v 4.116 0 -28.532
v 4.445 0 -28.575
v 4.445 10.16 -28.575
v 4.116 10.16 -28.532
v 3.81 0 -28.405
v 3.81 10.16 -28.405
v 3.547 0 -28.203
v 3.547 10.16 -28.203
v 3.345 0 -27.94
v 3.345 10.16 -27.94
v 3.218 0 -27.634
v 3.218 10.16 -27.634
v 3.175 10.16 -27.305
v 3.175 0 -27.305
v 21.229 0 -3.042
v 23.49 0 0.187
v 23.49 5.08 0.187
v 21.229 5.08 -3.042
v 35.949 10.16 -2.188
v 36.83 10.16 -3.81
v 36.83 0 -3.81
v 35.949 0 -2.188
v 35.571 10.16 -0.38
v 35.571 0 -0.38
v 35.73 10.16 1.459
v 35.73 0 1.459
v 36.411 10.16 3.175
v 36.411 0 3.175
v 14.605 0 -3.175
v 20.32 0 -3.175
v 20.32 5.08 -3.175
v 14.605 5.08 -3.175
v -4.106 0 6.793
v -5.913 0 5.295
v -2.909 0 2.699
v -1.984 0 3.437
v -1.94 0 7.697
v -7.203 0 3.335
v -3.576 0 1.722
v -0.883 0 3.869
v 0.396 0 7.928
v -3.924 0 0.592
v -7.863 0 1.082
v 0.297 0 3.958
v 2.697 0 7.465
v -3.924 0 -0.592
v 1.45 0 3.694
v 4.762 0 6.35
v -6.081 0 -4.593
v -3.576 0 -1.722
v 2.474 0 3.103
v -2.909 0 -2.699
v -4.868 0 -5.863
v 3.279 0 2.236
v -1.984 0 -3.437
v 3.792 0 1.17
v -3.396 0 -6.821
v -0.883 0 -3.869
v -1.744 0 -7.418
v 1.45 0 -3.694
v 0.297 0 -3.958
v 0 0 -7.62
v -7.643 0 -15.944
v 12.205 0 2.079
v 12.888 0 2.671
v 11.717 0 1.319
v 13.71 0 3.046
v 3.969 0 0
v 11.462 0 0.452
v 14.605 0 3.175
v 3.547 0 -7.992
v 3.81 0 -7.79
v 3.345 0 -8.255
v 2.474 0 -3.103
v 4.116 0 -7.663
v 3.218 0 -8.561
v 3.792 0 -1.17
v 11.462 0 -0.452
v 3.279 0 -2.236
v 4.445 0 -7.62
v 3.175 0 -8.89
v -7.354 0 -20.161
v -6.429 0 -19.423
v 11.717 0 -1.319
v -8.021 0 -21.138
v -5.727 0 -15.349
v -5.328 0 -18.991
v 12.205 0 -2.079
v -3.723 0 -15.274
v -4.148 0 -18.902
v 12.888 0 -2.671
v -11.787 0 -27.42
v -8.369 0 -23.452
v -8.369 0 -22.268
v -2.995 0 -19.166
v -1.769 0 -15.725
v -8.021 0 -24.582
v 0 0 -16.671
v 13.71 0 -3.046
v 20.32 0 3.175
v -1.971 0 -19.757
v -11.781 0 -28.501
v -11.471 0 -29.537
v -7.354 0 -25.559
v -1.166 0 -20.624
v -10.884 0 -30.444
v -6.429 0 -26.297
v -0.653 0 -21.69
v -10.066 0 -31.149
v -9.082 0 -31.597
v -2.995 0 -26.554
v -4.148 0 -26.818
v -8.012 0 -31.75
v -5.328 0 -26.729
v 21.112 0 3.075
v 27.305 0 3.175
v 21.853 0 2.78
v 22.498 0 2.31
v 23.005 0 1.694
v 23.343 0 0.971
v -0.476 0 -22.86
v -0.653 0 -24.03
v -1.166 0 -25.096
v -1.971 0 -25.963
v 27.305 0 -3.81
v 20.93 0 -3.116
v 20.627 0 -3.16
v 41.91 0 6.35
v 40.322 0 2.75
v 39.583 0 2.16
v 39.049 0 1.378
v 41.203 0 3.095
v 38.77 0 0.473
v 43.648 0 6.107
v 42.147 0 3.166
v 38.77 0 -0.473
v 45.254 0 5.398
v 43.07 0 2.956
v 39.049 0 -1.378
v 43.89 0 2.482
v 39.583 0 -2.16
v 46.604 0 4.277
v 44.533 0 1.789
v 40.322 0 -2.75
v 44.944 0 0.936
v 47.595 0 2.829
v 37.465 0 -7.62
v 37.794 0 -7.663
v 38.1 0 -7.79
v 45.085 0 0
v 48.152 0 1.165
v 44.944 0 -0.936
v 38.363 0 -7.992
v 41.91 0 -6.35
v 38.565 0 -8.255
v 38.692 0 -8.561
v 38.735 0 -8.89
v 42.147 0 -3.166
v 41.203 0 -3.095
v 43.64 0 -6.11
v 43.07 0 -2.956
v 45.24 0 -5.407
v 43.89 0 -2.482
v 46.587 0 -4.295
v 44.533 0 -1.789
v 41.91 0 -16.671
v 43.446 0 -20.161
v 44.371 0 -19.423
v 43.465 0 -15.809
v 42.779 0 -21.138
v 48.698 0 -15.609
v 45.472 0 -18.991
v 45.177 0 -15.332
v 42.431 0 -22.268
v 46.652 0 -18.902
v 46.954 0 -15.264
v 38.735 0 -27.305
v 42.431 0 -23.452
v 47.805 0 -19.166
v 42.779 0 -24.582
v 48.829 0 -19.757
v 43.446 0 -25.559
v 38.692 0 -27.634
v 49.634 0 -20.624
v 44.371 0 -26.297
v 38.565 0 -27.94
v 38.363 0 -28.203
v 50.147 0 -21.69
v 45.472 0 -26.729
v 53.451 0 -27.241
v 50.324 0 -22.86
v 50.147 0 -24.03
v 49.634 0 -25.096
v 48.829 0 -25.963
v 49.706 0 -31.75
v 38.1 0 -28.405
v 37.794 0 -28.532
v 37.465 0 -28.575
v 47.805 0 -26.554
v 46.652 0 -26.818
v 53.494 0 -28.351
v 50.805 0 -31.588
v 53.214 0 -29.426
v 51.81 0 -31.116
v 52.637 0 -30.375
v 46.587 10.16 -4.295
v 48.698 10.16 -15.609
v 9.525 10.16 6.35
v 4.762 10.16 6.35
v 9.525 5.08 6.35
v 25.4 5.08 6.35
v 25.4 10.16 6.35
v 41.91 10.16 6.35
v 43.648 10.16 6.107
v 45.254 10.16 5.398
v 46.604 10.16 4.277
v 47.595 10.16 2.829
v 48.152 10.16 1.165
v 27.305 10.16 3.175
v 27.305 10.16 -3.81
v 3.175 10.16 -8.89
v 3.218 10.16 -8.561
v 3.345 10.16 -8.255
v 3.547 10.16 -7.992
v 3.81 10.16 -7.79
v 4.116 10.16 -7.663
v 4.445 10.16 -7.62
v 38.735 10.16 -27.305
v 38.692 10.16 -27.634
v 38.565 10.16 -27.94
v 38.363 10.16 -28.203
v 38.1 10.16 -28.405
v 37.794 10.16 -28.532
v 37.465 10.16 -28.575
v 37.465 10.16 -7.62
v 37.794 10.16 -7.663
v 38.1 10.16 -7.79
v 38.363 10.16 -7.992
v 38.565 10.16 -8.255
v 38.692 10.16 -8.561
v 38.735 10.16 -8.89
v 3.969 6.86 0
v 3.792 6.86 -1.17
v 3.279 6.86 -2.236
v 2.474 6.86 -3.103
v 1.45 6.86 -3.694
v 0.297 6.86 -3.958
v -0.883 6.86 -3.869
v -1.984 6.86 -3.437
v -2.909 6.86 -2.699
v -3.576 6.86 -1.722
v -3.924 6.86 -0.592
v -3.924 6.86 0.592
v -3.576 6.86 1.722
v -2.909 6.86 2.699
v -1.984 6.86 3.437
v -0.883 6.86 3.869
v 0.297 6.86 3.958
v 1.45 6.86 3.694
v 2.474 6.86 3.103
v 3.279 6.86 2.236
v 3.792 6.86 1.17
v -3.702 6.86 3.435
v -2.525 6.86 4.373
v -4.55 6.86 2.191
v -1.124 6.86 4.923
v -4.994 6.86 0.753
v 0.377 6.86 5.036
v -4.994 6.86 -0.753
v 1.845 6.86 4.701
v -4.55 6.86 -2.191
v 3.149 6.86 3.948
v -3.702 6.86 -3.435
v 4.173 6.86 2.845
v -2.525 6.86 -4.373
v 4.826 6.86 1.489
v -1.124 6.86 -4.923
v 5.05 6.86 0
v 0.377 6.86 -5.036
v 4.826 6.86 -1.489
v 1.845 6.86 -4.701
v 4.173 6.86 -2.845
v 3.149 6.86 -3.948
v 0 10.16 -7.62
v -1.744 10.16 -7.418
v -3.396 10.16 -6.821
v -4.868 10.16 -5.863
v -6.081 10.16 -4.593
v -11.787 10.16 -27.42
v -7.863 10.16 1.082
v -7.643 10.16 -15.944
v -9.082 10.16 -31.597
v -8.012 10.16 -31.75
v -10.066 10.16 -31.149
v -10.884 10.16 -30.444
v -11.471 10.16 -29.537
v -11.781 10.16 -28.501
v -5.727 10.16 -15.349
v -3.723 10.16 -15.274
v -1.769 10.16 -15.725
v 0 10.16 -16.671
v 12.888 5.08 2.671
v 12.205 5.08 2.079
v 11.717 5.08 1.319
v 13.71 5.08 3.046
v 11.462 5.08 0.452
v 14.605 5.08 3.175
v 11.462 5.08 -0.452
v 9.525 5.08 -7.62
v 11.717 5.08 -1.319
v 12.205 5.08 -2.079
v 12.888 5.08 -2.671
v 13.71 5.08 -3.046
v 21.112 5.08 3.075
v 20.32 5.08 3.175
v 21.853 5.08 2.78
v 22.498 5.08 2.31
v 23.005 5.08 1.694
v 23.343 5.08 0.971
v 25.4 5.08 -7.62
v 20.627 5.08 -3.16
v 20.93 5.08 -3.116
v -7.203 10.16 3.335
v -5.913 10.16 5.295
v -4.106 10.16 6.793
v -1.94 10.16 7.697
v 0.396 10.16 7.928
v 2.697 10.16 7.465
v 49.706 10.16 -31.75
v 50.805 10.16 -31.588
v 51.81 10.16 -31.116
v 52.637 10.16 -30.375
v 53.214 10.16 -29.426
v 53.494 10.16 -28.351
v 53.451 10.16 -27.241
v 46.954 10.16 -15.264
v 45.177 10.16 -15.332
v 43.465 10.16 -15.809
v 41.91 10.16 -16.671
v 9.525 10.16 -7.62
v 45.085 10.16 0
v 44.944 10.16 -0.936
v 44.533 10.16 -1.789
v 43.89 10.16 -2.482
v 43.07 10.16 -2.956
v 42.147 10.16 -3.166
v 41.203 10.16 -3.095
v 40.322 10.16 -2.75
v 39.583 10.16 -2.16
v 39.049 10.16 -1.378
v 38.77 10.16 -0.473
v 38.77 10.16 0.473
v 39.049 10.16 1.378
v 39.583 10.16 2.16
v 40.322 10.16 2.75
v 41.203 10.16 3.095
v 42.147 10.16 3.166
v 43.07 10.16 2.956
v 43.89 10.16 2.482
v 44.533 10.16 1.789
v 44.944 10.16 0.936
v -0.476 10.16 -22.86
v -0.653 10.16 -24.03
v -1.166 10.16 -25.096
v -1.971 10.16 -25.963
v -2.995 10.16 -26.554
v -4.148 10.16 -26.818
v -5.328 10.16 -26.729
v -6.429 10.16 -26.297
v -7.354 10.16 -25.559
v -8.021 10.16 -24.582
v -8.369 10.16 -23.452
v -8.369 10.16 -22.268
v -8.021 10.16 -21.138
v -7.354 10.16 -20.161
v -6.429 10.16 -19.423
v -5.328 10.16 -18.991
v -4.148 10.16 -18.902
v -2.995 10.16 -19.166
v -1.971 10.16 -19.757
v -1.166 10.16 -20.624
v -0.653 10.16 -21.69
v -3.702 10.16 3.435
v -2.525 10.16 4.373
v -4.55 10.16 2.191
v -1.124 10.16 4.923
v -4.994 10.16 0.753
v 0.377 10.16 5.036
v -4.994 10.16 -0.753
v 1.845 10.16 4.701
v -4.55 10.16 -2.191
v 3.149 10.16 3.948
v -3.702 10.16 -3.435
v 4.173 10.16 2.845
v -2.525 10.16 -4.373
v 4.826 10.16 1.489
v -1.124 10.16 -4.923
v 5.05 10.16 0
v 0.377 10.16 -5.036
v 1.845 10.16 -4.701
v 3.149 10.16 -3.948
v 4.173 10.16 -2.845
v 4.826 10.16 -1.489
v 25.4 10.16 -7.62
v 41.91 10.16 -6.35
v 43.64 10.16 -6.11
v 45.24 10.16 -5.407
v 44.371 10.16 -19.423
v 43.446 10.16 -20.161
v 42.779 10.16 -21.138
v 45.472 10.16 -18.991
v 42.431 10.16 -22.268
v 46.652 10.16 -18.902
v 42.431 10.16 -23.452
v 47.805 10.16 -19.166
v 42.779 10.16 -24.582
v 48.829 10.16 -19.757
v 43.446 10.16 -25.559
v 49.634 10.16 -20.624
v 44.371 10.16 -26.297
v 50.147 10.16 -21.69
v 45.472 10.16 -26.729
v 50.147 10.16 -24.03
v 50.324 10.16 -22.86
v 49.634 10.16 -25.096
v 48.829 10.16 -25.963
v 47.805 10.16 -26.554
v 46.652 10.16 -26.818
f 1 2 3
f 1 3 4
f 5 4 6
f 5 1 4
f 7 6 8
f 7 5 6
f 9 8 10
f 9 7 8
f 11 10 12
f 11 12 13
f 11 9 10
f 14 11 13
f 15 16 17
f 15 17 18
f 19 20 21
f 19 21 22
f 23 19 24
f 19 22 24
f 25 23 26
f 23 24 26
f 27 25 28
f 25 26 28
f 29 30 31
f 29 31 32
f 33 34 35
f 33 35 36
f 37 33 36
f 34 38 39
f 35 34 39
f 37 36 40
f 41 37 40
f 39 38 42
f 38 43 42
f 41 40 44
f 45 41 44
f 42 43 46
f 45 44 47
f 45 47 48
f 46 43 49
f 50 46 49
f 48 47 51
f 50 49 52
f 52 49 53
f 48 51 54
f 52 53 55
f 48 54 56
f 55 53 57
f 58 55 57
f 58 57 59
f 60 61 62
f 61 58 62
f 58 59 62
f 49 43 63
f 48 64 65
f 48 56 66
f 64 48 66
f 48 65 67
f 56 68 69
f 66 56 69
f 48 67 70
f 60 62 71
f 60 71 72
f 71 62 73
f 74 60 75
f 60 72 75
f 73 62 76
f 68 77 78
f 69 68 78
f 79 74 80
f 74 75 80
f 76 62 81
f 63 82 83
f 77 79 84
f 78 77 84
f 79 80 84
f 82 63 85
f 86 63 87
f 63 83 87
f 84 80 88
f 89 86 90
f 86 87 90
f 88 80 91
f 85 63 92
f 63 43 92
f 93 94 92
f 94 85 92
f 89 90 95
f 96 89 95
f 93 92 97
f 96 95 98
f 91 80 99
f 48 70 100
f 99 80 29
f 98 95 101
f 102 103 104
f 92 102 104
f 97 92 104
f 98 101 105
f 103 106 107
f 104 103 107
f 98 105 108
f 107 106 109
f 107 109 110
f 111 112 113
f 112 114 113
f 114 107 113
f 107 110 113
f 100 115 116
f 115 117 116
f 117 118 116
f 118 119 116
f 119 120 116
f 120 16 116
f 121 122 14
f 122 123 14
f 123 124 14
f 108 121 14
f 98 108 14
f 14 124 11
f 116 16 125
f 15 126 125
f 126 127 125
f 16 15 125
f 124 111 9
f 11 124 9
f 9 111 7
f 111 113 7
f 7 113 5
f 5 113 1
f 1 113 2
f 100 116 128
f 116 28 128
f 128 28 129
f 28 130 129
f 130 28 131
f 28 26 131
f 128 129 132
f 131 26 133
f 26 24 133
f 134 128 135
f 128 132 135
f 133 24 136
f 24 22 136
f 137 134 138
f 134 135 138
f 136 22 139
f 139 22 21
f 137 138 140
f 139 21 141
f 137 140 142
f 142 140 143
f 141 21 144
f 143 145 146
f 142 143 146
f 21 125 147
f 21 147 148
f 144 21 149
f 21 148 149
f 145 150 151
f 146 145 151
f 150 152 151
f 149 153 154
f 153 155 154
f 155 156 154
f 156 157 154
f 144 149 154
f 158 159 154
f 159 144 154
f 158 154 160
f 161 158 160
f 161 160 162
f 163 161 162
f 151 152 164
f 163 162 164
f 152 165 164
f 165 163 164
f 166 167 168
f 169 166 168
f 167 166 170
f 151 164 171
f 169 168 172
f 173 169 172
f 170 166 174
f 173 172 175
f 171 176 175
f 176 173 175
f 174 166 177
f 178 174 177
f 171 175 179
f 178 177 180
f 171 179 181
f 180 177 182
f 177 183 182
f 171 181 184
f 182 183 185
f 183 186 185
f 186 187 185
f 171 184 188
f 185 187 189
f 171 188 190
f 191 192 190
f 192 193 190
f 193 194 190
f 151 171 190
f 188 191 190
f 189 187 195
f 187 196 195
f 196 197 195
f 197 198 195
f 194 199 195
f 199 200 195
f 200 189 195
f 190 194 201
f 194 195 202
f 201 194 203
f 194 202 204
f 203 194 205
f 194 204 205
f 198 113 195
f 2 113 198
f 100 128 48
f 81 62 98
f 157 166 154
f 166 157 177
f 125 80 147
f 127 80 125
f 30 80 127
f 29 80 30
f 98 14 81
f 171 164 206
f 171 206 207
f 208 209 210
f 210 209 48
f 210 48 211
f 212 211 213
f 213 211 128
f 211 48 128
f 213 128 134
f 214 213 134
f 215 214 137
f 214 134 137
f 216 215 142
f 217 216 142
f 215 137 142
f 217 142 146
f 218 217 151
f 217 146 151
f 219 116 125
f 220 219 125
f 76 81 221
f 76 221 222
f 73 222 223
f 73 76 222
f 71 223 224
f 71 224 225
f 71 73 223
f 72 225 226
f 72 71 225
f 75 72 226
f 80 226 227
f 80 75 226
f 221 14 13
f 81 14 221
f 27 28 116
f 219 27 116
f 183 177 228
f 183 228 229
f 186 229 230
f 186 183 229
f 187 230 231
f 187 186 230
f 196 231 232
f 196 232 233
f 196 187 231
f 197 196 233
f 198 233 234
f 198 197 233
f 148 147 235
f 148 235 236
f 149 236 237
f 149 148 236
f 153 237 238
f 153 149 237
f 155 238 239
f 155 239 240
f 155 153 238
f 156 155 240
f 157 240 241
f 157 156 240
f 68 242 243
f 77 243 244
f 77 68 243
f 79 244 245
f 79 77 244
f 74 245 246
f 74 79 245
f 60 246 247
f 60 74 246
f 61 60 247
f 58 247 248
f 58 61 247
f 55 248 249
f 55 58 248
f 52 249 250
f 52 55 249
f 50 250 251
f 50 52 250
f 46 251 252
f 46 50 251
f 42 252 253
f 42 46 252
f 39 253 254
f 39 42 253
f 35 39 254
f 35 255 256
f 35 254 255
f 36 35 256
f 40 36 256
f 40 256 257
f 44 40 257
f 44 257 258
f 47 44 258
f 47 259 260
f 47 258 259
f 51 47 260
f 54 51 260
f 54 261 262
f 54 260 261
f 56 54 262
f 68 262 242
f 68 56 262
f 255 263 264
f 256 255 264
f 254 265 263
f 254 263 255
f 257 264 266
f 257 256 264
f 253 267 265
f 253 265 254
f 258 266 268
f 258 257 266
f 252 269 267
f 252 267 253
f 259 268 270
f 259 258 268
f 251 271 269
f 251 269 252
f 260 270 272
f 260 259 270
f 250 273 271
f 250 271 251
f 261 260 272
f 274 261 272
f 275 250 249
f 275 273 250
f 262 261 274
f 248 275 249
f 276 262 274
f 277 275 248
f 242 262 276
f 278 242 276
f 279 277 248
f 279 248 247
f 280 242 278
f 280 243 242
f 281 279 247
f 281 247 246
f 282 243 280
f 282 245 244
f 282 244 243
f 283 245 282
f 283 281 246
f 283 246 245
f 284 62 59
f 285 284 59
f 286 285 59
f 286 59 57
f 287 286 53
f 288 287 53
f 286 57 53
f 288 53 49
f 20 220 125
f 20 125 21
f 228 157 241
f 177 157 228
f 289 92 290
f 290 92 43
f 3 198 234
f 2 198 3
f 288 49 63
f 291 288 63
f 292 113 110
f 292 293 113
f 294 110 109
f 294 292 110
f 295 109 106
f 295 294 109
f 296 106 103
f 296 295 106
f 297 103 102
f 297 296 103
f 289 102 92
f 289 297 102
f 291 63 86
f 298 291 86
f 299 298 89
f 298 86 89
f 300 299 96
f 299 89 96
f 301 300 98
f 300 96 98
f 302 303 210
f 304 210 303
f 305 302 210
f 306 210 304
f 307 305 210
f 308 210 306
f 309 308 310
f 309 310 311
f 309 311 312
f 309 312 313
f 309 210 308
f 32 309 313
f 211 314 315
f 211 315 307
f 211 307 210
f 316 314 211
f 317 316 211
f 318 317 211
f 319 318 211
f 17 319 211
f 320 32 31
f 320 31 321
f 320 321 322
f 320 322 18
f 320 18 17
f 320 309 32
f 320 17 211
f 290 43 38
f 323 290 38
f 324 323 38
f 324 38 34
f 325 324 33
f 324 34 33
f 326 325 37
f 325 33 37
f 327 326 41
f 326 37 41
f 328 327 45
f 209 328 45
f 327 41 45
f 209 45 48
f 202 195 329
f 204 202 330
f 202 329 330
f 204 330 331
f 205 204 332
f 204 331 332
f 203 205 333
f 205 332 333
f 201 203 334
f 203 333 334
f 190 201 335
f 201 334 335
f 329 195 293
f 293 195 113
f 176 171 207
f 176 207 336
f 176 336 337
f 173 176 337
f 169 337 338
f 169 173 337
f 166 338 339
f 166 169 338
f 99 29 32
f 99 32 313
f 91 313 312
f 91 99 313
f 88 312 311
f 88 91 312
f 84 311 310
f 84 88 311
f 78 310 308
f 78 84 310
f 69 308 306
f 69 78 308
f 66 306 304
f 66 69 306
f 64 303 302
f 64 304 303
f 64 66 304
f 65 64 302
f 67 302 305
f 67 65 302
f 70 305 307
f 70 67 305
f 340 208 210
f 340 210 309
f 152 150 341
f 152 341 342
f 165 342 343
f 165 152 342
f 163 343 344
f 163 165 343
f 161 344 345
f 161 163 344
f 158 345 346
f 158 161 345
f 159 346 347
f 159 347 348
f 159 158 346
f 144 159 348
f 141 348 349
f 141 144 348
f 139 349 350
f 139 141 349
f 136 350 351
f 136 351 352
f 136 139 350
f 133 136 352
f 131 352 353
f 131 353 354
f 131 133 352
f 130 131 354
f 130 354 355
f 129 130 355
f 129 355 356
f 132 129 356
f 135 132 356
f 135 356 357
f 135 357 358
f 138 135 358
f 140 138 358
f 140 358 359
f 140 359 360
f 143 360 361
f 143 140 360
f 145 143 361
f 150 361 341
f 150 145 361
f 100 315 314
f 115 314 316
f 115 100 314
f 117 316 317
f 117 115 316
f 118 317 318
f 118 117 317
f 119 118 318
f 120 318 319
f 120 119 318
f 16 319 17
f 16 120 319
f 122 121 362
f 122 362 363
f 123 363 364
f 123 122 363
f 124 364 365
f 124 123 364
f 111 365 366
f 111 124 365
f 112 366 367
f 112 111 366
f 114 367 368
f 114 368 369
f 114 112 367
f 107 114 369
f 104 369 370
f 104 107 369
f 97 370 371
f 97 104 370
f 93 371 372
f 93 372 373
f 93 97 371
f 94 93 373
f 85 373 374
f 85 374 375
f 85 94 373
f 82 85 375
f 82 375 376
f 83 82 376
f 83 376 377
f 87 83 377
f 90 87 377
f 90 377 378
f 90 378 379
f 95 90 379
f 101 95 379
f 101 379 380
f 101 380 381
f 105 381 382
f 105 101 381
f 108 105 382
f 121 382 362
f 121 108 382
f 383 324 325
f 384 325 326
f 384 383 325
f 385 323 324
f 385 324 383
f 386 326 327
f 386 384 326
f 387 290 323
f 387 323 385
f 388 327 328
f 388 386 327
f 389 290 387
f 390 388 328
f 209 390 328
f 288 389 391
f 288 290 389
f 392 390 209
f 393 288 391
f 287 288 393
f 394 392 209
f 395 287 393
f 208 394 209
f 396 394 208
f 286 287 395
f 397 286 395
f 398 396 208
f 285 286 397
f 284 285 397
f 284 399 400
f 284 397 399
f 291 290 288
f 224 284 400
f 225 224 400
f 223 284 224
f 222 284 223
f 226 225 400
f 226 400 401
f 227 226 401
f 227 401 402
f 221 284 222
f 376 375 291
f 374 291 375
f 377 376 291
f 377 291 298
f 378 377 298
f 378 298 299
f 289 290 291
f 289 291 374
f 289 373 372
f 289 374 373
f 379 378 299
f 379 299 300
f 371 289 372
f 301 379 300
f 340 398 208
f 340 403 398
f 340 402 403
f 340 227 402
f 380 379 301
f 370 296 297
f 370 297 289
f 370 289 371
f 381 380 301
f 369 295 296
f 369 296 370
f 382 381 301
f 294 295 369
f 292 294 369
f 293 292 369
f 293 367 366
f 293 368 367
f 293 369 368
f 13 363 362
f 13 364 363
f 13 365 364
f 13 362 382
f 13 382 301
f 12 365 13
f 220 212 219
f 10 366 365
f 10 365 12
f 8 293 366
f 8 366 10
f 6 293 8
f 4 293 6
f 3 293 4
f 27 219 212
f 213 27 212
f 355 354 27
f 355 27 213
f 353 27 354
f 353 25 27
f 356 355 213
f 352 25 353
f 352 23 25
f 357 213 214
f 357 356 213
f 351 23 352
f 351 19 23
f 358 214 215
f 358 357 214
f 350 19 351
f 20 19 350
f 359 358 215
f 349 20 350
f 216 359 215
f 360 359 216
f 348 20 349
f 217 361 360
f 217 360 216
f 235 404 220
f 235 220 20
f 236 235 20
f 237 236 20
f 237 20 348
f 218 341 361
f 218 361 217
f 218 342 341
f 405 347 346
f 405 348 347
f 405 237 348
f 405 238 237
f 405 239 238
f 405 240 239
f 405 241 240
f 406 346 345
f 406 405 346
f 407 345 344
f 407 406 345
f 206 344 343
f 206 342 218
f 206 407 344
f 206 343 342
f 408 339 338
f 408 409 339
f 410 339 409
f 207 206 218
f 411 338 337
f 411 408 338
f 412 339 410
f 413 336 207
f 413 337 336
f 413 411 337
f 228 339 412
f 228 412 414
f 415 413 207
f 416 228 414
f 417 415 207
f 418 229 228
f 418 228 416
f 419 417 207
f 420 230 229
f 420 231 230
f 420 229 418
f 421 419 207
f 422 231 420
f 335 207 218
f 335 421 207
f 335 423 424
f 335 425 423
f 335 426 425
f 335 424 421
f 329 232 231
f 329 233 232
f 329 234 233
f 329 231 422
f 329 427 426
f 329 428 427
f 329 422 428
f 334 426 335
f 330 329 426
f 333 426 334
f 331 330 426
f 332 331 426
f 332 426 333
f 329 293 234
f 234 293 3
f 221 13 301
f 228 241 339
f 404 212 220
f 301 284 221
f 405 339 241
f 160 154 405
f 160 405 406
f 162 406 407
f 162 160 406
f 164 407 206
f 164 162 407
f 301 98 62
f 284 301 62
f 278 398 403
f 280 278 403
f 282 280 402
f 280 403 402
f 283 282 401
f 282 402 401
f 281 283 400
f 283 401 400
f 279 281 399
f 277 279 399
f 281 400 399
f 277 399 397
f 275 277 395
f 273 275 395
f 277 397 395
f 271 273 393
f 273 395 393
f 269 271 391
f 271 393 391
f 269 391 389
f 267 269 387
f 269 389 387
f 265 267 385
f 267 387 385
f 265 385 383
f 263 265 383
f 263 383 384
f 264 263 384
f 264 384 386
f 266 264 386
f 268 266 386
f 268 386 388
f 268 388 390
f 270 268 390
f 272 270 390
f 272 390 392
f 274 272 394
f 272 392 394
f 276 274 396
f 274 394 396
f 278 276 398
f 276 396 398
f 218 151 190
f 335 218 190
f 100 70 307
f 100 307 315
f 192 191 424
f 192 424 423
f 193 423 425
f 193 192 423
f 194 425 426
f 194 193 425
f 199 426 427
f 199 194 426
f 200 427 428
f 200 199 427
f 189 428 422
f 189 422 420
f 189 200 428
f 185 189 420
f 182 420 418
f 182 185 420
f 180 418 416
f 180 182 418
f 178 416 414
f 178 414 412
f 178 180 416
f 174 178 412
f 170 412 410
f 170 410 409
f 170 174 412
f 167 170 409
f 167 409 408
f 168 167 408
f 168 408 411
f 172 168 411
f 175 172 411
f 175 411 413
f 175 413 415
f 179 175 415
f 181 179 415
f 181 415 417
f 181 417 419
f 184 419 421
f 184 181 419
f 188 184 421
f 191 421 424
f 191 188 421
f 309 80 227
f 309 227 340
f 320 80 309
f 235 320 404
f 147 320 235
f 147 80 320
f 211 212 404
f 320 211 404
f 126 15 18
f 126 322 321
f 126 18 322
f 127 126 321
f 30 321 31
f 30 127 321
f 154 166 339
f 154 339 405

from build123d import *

# Parameters (mm, degrees)
SKETCH3_R           = 3.96875
SKETCH3_R_2         = 3.175
BOSS_EXTRUDE4_DEPTH = 10.16
SKETCH5_W           = 15.875
SKETCH5_H           = 13.97
CUT_EXTRUDE3_DEPTH  = 5.08
FILLET1_R           = 3.81
SKETCH6_R           = 5.05
CUT_EXTRUDE4_DEPTH  = 3.3


with BuildPart() as part:
    # Sketch3 → Boss-Extrude4 (new body)
    with BuildSketch(Plane(origin=(0, 0, 0), x_dir=(1, 0, 0), z_dir=(0, 1, 0))):
        with BuildLine():
            Line((54.2925, 31.75), (-12.3825, 31.75))
            Line((-12.3825, 31.75), (-7.863361559, -1.082336008))
            ThreePointArc((-7.863361559, -1.082336008), (-3.056289676, -7.325503373), (4.7625, -6.35))
            Line((4.7625, -6.35), (41.91, -6.35))
            ThreePointArc((41.91, -6.35), (45.967580476, -4.884520517), (48.152310263, -1.164501002))
            Line((48.152310263, -1.164501002), (54.2925, 31.75))
        make_face()
        Circle(SKETCH3_R, mode=Mode.SUBTRACT)
        with Locations((-4.445, 22.86)):
            Circle(SKETCH3_R, mode=Mode.SUBTRACT)
        with Locations((46.355, 22.86)):
            Circle(SKETCH3_R, mode=Mode.SUBTRACT)
        with Locations((41.91, 0)):
            Circle(SKETCH3_R_2, mode=Mode.SUBTRACT)
        with BuildLine():
            Line((38.735, 8.89), (38.735, 27.305))
            ThreePointArc((38.735, 27.305), (38.363025612, 28.203025612), (37.465, 28.575))
            Line((37.465, 28.575), (4.445, 28.575))
            ThreePointArc((4.445, 28.575), (3.546974388, 28.203025612), (3.175, 27.305))
            Line((3.175, 27.305), (3.175, 8.89))
            ThreePointArc((3.175, 8.89), (3.546974388, 7.991974388), (4.445, 7.62))
            Line((4.445, 7.62), (37.465, 7.62))
            ThreePointArc((37.465, 7.62), (38.363025612, 7.991974388), (38.735, 8.89))
        make_face(mode=Mode.SUBTRACT)
        with BuildLine():
            Line((20.32, 3.175), (14.605, 3.175))
            ThreePointArc((14.605, 3.175), (11.43, 0), (14.605, -3.175))
            Line((14.605, -3.175), (20.32, -3.175))
            ThreePointArc((20.32, -3.175), (22.498043553, -2.310140965), (23.489504023, -0.186733089))
            Line((23.489504023, -0.186733089), (21.228562514, 3.04222602))
            ThreePointArc((21.228562514, 3.04222602), (20.779106407, 3.141631154), (20.32, 3.175))
        make_face(mode=Mode.SUBTRACT)
        with BuildLine():
            Line((46.58698696, 4.295147609), (48.697586564, 15.60902157))
            ThreePointArc((48.697586564, 15.60902157), (45.177345011, 15.331552037), (41.91, 16.670785591))
            Line((41.91, 16.670785591), (41.91, 6.35))
            ThreePointArc((41.91, 6.35), (44.464242812, 5.81363429), (46.58698696, 4.295147609))
        make_face(mode=Mode.SUBTRACT)
        with BuildLine():
            Line((-6.080523252, 4.592563226), (-7.642900683, 15.943510195))
            ThreePointArc((-7.642900683, 15.943510195), (-3.723164456, 15.274266453), (0, 16.670785591))
            Line((0, 16.670785591), (0, 7.62))
            ThreePointArc((0, 7.62), (-3.396252951, 6.82128037), (-6.080523252, 4.592563226))
        make_face(mode=Mode.SUBTRACT)
        with BuildLine():
            Line((36.410738686, -3.175), (27.305, -3.175))
            Line((27.305, -3.175), (27.305, 3.81))
            Line((27.305, 3.81), (36.83, 3.81))
            ThreePointArc((36.83, 3.81), (35.571407985, 0.380461907), (36.410738686, -3.175))
        make_face(mode=Mode.SUBTRACT)
    extrude(amount=BOSS_EXTRUDE4_DEPTH)

    # Sketch5 → Cut-Extrude3 (cut)
    with BuildSketch(Plane(origin=(0, 10.16, 0), x_dir=(1, 0, 0), z_dir=(0, 1, 0))):
        with Locations((17.4625, 0.635)):
            Rectangle(SKETCH5_W, SKETCH5_H)
    extrude(amount=-CUT_EXTRUDE3_DEPTH, mode=Mode.SUBTRACT)

    # Fillet1
    fillet1_edges = [part.edges().sort_by_distance(p)[0] for p in [
        (-12.3825, 5.08, -31.75),
        (54.2925, 5.08, -31.75),
    ]]
    fillet(fillet1_edges, radius=FILLET1_R)

    # Sketch6 → Cut-Extrude4 (cut)
    with BuildSketch(Plane(origin=(0, 10.16, 0), x_dir=(1, 0, 0), z_dir=(0, 1, 0))):
        Circle(SKETCH6_R)
    extrude(amount=-CUT_EXTRUDE4_DEPTH, mode=Mode.SUBTRACT)


solid = part.part
